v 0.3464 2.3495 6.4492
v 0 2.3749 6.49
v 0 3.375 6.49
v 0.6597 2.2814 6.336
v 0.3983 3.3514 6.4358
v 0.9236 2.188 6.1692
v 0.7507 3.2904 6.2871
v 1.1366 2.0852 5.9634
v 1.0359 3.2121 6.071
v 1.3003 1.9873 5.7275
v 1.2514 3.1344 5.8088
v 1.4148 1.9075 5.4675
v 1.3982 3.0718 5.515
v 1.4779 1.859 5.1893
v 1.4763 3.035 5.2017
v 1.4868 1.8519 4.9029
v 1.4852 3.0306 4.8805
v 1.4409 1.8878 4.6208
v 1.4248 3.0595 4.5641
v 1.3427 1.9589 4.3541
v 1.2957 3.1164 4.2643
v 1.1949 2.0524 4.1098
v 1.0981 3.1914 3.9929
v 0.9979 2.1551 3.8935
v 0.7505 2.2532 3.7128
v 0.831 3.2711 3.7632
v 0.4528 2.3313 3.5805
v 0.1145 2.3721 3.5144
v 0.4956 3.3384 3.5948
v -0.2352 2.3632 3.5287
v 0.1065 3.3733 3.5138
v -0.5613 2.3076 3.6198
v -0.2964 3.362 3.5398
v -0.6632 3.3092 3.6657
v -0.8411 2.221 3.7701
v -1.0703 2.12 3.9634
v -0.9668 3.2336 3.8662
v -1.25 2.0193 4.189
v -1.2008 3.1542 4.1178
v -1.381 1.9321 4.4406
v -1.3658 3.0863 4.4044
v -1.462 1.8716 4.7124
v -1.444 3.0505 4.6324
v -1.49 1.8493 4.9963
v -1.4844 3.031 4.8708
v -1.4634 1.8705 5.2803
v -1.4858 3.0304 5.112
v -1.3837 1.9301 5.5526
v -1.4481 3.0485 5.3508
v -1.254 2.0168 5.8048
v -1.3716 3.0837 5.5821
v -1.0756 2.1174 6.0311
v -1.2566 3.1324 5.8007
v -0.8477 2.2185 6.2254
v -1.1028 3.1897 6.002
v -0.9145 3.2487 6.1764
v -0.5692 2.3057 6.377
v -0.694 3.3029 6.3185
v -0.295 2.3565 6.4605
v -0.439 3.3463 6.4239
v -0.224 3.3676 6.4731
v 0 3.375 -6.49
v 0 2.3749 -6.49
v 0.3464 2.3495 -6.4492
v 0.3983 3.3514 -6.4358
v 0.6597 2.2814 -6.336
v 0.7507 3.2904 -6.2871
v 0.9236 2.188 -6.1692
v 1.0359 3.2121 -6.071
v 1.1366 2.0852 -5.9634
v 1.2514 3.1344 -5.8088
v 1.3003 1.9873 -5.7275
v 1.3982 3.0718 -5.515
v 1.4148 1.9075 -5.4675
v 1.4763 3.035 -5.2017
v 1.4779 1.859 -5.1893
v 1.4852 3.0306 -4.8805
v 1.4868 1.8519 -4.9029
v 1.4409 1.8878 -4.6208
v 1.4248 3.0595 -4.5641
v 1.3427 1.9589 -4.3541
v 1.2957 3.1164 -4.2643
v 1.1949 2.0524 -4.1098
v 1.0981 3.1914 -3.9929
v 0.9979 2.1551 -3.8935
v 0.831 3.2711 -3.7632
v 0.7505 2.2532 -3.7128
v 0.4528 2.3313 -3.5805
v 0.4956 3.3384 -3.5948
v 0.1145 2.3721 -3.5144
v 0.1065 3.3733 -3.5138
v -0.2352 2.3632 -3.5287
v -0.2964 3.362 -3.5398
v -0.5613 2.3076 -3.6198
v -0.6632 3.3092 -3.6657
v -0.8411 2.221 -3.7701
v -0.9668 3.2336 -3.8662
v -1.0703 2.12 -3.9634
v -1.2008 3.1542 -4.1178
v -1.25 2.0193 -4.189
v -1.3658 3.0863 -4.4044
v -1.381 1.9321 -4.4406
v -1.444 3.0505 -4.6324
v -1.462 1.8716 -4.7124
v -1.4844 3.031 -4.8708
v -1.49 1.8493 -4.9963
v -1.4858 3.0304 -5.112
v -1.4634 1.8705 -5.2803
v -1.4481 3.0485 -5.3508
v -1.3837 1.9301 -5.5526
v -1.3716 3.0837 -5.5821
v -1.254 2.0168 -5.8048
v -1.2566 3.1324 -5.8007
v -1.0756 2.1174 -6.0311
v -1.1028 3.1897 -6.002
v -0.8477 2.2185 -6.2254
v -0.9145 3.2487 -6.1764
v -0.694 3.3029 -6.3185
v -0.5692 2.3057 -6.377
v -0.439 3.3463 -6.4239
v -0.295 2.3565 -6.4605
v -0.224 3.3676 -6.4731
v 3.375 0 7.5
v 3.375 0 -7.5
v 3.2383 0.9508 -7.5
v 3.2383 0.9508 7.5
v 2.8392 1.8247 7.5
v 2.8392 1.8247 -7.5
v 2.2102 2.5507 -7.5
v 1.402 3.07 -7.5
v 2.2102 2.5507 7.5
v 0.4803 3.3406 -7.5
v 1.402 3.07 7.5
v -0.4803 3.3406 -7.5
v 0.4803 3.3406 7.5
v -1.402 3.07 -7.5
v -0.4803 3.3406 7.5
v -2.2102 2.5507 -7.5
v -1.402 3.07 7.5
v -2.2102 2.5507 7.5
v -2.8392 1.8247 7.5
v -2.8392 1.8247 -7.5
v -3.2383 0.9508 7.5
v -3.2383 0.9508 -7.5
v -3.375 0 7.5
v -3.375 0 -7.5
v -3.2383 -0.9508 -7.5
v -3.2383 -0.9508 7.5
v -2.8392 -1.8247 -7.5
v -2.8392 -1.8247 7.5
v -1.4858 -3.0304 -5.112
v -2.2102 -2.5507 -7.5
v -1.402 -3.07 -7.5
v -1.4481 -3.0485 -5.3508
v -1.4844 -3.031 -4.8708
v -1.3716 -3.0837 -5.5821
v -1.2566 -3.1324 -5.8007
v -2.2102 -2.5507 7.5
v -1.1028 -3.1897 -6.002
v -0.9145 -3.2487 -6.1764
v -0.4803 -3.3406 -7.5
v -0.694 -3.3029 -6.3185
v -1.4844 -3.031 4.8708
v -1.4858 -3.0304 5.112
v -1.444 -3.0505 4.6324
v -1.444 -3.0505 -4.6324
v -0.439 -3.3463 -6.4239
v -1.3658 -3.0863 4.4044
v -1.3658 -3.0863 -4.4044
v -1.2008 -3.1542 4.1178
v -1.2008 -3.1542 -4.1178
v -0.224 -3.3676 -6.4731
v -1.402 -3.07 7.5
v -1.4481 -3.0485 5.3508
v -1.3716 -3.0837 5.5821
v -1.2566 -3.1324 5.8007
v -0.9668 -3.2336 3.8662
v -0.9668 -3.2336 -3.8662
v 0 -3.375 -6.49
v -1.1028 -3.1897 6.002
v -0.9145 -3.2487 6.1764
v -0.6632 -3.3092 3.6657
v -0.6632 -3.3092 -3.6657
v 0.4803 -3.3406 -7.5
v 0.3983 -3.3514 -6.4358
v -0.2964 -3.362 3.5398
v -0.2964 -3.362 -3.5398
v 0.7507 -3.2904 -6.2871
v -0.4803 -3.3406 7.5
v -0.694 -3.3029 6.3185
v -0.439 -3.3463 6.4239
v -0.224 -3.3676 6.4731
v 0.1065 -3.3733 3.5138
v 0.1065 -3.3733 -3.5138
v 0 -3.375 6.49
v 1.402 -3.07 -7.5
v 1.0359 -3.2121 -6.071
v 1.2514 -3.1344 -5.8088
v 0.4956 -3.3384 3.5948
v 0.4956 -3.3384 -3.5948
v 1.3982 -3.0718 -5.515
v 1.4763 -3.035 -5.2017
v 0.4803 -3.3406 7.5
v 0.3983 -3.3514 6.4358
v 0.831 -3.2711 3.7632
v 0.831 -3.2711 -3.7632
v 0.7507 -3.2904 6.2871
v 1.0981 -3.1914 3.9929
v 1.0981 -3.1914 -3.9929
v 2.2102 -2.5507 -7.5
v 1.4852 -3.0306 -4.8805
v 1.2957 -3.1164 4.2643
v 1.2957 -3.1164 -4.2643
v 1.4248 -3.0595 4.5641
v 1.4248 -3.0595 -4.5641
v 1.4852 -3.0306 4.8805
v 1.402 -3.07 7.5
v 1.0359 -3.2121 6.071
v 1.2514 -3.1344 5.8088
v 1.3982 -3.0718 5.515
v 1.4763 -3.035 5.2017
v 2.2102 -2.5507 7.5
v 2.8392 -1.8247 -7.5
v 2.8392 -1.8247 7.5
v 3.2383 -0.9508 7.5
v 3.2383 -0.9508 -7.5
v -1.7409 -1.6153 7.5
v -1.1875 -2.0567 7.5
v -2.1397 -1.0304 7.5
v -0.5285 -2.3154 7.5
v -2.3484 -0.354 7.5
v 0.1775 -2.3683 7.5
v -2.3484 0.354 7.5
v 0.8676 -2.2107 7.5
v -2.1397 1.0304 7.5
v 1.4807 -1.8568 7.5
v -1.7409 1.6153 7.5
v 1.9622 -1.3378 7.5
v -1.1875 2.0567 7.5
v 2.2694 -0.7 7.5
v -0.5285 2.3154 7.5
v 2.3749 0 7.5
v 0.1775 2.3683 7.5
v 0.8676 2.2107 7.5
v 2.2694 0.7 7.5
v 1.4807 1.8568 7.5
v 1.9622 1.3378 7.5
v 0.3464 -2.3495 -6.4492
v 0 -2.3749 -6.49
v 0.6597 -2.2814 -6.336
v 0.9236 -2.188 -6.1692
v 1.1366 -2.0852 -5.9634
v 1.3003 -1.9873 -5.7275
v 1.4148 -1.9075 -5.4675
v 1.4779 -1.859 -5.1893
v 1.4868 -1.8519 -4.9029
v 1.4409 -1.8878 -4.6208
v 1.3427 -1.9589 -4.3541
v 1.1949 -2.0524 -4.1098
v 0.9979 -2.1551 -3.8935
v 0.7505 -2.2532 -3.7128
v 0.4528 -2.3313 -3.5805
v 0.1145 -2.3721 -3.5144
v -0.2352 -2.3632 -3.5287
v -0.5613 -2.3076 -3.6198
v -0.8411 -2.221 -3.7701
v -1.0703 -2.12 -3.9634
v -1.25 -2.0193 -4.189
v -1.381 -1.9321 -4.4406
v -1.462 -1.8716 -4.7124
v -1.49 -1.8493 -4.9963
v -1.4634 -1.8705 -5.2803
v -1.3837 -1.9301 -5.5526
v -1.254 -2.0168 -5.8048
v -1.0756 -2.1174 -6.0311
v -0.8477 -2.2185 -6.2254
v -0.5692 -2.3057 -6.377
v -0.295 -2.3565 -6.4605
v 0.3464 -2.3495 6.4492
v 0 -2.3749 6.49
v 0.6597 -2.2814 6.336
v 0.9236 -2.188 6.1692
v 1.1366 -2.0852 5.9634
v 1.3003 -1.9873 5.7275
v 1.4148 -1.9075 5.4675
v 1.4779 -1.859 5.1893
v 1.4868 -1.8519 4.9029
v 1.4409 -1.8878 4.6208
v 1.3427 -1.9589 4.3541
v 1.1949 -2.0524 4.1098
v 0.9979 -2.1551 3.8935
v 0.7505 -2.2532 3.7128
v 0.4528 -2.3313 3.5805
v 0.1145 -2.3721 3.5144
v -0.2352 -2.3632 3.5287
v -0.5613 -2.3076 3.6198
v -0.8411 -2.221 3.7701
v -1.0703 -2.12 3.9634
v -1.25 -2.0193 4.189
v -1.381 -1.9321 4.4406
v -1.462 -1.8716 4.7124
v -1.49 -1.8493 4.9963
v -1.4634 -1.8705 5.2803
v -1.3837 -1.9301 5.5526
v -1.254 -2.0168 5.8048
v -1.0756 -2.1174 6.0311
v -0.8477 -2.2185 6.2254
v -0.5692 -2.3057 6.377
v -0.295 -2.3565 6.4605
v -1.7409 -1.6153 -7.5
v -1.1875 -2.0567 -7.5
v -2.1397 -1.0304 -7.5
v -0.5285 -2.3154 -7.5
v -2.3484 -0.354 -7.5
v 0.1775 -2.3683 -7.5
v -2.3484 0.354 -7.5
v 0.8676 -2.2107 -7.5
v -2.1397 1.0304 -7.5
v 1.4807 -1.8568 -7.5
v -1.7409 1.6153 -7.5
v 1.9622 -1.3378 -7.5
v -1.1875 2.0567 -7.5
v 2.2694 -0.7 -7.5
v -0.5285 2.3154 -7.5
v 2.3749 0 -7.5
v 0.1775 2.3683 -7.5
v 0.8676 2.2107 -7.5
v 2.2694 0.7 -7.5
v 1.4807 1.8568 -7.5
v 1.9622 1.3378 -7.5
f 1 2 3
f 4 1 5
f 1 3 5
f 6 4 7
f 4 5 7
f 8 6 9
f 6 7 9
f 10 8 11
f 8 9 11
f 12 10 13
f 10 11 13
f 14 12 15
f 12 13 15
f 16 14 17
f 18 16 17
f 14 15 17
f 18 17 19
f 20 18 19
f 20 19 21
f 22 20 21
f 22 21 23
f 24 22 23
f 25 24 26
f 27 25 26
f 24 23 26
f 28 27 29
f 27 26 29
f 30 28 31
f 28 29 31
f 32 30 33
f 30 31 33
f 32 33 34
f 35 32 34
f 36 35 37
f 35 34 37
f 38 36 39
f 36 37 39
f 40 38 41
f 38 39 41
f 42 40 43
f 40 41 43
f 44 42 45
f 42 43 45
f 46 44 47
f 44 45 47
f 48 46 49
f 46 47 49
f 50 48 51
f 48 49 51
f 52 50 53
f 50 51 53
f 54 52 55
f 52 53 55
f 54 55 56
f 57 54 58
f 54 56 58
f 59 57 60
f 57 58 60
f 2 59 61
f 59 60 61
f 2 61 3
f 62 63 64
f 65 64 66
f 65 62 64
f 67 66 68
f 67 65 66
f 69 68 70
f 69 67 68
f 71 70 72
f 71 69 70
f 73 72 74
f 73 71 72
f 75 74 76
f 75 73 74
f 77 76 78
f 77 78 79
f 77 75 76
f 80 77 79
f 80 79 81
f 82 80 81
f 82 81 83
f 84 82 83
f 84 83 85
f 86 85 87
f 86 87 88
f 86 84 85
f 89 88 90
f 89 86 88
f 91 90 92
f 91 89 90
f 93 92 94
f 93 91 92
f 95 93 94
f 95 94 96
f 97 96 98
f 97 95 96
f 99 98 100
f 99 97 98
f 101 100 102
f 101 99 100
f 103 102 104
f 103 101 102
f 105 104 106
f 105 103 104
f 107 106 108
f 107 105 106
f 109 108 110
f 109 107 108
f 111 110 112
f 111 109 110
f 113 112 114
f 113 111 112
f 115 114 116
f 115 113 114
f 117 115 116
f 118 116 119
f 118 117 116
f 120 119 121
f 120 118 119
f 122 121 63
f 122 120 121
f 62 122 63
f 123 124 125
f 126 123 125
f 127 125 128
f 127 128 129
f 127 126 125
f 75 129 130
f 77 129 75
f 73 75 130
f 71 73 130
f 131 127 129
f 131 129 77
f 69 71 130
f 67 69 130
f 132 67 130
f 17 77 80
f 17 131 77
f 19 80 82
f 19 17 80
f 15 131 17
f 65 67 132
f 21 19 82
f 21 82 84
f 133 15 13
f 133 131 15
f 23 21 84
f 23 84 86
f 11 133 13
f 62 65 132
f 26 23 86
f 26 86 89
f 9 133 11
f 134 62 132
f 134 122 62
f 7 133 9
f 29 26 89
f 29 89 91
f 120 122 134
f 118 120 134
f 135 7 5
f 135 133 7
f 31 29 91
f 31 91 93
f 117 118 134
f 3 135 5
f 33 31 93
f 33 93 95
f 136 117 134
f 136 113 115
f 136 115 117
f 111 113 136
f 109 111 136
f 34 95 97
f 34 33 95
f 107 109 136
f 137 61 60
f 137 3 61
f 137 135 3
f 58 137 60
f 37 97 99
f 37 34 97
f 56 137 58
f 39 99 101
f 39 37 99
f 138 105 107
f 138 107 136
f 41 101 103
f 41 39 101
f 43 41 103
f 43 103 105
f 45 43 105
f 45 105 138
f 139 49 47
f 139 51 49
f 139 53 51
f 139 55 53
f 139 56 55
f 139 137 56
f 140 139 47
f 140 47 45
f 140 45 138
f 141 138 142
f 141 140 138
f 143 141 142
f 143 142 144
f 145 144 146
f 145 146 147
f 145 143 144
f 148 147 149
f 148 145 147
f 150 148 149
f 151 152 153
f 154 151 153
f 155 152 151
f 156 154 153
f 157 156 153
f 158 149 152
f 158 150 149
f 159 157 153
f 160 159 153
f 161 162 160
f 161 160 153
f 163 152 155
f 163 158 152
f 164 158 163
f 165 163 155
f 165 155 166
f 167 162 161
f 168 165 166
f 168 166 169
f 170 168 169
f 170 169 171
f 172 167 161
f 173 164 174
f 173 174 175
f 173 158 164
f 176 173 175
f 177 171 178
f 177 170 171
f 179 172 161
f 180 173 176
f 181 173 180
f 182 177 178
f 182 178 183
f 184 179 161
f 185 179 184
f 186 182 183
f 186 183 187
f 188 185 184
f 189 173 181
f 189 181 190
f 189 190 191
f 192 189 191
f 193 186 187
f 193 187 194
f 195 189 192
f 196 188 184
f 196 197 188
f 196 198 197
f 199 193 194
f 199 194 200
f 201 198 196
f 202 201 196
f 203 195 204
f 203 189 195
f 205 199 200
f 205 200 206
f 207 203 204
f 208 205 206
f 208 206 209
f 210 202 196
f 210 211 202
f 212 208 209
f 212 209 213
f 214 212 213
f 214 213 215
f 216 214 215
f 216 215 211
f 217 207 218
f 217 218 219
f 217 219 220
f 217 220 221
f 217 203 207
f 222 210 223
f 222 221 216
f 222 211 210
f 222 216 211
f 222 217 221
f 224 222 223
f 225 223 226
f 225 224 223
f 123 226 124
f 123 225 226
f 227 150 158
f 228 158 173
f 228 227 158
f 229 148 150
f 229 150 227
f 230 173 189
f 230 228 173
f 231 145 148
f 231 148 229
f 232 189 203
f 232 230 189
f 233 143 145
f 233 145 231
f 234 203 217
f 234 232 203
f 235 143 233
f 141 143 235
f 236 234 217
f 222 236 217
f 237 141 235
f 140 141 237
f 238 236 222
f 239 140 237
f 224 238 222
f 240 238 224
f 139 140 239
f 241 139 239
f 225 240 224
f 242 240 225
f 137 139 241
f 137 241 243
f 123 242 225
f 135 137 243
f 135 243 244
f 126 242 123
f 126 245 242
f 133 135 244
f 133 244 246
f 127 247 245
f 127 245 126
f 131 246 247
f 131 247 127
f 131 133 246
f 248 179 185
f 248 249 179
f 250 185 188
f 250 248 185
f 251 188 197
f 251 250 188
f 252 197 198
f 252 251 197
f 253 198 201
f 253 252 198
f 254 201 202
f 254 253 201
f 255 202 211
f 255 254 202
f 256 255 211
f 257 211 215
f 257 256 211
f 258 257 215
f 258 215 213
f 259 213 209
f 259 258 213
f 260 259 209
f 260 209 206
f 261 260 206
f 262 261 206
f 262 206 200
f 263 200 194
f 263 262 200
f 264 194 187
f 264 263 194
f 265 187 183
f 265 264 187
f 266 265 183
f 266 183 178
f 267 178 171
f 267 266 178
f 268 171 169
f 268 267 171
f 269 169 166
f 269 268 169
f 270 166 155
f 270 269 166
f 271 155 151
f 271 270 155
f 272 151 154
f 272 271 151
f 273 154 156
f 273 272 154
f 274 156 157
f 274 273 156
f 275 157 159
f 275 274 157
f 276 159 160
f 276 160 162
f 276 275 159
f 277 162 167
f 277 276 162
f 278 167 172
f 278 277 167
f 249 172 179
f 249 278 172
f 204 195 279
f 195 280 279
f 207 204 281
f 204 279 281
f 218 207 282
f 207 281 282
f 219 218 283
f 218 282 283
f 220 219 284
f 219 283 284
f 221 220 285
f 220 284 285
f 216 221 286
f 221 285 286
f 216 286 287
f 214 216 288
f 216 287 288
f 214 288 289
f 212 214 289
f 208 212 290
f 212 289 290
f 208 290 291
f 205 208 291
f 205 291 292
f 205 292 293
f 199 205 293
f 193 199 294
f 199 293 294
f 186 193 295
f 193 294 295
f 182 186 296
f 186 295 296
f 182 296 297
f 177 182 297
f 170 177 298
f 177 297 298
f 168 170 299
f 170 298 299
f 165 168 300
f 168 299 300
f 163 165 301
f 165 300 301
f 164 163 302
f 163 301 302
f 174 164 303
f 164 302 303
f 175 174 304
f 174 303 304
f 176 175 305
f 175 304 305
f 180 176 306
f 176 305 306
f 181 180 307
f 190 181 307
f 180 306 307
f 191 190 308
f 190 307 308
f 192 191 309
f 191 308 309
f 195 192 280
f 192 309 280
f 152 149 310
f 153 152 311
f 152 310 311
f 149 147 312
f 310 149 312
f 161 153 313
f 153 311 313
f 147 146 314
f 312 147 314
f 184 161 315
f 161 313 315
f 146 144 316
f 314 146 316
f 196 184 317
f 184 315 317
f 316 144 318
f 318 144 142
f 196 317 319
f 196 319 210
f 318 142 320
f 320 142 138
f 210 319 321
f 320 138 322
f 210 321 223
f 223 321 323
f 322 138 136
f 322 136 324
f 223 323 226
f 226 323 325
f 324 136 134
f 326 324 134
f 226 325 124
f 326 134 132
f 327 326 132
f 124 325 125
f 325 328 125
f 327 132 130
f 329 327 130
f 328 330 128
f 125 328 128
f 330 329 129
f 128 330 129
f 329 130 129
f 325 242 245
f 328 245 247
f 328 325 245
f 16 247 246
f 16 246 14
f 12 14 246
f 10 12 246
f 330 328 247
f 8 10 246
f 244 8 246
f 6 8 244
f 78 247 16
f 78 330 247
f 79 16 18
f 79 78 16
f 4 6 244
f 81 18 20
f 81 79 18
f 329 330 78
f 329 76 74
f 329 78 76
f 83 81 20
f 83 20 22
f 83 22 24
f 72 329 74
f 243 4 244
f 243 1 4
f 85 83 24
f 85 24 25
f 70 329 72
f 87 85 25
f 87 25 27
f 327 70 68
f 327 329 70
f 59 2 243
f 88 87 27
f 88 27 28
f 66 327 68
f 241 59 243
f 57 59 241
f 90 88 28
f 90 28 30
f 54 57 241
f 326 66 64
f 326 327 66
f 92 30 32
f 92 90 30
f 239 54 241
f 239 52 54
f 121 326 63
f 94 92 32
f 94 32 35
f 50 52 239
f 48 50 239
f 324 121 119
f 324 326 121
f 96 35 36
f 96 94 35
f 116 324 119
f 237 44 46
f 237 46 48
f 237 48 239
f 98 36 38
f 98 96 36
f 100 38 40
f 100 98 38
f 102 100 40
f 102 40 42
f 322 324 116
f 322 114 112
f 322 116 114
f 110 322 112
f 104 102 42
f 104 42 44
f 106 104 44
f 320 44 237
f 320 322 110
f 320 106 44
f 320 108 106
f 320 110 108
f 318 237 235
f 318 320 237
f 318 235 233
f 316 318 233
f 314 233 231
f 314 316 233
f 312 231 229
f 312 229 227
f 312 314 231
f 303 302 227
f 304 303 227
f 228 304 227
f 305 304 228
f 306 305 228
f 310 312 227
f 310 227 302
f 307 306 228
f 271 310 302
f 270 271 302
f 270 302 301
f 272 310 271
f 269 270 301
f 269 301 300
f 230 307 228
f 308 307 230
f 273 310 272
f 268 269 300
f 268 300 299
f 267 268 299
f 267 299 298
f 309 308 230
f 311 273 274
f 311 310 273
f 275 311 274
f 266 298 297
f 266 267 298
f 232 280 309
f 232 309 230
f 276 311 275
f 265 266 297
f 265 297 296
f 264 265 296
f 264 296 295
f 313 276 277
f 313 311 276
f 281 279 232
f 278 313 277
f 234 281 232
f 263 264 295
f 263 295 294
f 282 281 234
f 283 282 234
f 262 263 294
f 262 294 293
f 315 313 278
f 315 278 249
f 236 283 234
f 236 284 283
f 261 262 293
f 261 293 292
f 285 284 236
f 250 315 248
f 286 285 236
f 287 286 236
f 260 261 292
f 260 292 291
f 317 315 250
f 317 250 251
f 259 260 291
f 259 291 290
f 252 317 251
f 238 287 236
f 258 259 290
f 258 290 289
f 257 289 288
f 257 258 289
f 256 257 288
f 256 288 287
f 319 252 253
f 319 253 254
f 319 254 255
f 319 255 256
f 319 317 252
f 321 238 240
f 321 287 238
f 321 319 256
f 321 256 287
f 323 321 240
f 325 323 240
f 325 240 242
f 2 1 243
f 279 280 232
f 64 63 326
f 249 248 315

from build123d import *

# Parameters (mm, degrees)
SKETCH1_R           = 3.375
SKETCH1_R_2         = 2.3749
BOSS_EXTRUDE1_DEPTH = 7.5
SKETCH2_R           = 1.49
CUT_EXTRUDE1_DEPTH  = 12.5


with BuildPart() as part:
    # Sketch1 → Boss-Extrude1 (new, symmetric)
    with BuildSketch(Plane.XY):
        Circle(SKETCH1_R)
        Circle(SKETCH1_R_2, mode=Mode.SUBTRACT)
    extrude(amount=BOSS_EXTRUDE1_DEPTH, both=True)

    # Sketch2 → Cut-Extrude1 (cut, symmetric)
    with BuildSketch(Plane(origin=(0, 0, 0), x_dir=(1, 0, 0), z_dir=(0, 1, 0))):
        with Locations(Location((0, -5, 0), (0, 0, 270))):
            Circle(SKETCH2_R)
    cut_extrude1 = extrude(amount=CUT_EXTRUDE1_DEPTH, both=True, mode=Mode.SUBTRACT)

    # Mirror1: Cut-Extrude1 across plane
    add(cut_extrude1.mirror(Plane.XY), mode=Mode.SUBTRACT)


solid = part.part
